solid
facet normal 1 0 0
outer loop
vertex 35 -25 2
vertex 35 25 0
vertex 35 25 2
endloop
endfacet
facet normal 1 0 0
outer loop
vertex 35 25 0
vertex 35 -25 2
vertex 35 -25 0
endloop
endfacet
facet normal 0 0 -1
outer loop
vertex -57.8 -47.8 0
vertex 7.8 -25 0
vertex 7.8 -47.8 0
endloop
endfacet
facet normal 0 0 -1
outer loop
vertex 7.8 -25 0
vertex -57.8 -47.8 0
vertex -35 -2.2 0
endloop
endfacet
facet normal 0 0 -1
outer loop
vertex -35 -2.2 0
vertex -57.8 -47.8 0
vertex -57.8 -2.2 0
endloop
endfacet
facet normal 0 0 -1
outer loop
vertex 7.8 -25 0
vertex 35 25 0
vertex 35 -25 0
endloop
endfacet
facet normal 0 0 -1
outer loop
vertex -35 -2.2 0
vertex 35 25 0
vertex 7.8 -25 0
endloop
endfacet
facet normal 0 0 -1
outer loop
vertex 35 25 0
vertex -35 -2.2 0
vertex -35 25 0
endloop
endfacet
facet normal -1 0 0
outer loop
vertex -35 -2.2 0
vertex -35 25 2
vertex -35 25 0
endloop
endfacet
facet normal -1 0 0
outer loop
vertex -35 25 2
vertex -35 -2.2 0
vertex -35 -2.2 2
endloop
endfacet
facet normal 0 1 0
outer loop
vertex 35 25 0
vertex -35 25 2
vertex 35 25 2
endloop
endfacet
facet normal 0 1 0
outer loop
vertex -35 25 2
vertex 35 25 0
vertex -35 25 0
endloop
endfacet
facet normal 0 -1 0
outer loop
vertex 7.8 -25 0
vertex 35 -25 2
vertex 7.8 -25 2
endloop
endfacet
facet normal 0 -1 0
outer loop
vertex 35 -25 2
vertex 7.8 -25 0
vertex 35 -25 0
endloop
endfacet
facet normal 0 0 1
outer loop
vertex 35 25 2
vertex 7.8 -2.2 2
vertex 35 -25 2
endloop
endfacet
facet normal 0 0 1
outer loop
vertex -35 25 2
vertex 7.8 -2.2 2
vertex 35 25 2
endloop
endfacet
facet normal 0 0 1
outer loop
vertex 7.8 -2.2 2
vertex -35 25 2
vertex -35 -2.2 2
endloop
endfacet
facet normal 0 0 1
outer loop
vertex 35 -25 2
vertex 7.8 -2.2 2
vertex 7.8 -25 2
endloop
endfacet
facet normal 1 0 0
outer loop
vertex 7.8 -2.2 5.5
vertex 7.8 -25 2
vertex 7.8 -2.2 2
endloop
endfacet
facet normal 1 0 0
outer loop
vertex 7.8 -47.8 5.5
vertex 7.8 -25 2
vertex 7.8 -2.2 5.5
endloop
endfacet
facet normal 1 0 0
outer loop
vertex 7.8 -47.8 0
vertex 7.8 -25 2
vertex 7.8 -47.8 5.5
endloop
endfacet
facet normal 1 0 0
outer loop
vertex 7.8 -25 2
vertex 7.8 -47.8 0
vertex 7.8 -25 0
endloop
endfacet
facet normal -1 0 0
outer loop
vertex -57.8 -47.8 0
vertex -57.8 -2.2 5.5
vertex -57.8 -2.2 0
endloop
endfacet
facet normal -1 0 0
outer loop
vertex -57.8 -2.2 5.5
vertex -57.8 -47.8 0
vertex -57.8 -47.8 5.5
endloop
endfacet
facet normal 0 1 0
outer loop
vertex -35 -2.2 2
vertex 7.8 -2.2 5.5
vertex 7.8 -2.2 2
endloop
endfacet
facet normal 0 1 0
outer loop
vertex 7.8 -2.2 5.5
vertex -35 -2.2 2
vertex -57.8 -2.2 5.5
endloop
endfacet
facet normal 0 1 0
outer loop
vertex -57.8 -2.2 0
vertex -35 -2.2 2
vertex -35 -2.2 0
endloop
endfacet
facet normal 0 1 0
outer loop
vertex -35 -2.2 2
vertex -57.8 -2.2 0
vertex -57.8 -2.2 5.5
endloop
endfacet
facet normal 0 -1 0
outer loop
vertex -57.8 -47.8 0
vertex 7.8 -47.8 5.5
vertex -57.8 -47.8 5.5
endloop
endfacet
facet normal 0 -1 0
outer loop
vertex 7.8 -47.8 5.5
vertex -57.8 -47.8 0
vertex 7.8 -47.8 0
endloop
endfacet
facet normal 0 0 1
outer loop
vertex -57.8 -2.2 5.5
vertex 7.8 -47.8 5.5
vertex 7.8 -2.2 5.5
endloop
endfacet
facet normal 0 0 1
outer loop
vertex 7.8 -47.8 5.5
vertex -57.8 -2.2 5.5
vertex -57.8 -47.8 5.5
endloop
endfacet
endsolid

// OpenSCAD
// Two-part enclosure for small electronics board
// Print orientation: box on bed (z = 0), lid on +X side, both build upward

$fn = 64;

// ---- Dimensions (mm) ----
box_x      = 70;    // box outer length (X)
box_y      = 50;    // box outer width (Y)
box_z      = 30;    // box outer height (Z)
wall       = 2;     // box wall thickness
floor      = 2;     // box floor thickness
gap        = 10;    // gap between box and lid

lip_x      = 65.6;  // lid lip outer length (X)
lip_y      = 45.6;  // lid lip outer width (Y)
lip_t      = 1.5;   // lid lip thickness
lip_h      = 4;     // lid lip height above plate

eps        = 0.5;   // cutter overshoot past faces

// ---- Derived ----
box_x0 = -box_x / 2;
box_y0 = -box_y / 2;
box_z0 = floor;     // inner cavity starts at z = floor

// ---- Model ----
union() {
    // Box: open-top enclosure
    difference() {
        translate([box_x0, box_y0, 0])
            cube([box_x, box_y, box_z]);
        translate([box_x0, box_y0, box_z0])
            cube([box_x, box_y, box_z - box_z0 + eps]); // open top
    }

    // Lid: plate with sliding lip, printed upside down
    translate([box_x0 + gap, box_y0, 0]) {
        // Base plate
        translate([-lip_x / 2, -lip_y / 2, 0])
            cube([lip_x, lip_y, lip_t]);
        // Lip on top of plate
        translate([-lip_x / 2, -lip_y / 2, lip_t])
            cube([lip_x, lip_y, lip_h]);
    }
}
